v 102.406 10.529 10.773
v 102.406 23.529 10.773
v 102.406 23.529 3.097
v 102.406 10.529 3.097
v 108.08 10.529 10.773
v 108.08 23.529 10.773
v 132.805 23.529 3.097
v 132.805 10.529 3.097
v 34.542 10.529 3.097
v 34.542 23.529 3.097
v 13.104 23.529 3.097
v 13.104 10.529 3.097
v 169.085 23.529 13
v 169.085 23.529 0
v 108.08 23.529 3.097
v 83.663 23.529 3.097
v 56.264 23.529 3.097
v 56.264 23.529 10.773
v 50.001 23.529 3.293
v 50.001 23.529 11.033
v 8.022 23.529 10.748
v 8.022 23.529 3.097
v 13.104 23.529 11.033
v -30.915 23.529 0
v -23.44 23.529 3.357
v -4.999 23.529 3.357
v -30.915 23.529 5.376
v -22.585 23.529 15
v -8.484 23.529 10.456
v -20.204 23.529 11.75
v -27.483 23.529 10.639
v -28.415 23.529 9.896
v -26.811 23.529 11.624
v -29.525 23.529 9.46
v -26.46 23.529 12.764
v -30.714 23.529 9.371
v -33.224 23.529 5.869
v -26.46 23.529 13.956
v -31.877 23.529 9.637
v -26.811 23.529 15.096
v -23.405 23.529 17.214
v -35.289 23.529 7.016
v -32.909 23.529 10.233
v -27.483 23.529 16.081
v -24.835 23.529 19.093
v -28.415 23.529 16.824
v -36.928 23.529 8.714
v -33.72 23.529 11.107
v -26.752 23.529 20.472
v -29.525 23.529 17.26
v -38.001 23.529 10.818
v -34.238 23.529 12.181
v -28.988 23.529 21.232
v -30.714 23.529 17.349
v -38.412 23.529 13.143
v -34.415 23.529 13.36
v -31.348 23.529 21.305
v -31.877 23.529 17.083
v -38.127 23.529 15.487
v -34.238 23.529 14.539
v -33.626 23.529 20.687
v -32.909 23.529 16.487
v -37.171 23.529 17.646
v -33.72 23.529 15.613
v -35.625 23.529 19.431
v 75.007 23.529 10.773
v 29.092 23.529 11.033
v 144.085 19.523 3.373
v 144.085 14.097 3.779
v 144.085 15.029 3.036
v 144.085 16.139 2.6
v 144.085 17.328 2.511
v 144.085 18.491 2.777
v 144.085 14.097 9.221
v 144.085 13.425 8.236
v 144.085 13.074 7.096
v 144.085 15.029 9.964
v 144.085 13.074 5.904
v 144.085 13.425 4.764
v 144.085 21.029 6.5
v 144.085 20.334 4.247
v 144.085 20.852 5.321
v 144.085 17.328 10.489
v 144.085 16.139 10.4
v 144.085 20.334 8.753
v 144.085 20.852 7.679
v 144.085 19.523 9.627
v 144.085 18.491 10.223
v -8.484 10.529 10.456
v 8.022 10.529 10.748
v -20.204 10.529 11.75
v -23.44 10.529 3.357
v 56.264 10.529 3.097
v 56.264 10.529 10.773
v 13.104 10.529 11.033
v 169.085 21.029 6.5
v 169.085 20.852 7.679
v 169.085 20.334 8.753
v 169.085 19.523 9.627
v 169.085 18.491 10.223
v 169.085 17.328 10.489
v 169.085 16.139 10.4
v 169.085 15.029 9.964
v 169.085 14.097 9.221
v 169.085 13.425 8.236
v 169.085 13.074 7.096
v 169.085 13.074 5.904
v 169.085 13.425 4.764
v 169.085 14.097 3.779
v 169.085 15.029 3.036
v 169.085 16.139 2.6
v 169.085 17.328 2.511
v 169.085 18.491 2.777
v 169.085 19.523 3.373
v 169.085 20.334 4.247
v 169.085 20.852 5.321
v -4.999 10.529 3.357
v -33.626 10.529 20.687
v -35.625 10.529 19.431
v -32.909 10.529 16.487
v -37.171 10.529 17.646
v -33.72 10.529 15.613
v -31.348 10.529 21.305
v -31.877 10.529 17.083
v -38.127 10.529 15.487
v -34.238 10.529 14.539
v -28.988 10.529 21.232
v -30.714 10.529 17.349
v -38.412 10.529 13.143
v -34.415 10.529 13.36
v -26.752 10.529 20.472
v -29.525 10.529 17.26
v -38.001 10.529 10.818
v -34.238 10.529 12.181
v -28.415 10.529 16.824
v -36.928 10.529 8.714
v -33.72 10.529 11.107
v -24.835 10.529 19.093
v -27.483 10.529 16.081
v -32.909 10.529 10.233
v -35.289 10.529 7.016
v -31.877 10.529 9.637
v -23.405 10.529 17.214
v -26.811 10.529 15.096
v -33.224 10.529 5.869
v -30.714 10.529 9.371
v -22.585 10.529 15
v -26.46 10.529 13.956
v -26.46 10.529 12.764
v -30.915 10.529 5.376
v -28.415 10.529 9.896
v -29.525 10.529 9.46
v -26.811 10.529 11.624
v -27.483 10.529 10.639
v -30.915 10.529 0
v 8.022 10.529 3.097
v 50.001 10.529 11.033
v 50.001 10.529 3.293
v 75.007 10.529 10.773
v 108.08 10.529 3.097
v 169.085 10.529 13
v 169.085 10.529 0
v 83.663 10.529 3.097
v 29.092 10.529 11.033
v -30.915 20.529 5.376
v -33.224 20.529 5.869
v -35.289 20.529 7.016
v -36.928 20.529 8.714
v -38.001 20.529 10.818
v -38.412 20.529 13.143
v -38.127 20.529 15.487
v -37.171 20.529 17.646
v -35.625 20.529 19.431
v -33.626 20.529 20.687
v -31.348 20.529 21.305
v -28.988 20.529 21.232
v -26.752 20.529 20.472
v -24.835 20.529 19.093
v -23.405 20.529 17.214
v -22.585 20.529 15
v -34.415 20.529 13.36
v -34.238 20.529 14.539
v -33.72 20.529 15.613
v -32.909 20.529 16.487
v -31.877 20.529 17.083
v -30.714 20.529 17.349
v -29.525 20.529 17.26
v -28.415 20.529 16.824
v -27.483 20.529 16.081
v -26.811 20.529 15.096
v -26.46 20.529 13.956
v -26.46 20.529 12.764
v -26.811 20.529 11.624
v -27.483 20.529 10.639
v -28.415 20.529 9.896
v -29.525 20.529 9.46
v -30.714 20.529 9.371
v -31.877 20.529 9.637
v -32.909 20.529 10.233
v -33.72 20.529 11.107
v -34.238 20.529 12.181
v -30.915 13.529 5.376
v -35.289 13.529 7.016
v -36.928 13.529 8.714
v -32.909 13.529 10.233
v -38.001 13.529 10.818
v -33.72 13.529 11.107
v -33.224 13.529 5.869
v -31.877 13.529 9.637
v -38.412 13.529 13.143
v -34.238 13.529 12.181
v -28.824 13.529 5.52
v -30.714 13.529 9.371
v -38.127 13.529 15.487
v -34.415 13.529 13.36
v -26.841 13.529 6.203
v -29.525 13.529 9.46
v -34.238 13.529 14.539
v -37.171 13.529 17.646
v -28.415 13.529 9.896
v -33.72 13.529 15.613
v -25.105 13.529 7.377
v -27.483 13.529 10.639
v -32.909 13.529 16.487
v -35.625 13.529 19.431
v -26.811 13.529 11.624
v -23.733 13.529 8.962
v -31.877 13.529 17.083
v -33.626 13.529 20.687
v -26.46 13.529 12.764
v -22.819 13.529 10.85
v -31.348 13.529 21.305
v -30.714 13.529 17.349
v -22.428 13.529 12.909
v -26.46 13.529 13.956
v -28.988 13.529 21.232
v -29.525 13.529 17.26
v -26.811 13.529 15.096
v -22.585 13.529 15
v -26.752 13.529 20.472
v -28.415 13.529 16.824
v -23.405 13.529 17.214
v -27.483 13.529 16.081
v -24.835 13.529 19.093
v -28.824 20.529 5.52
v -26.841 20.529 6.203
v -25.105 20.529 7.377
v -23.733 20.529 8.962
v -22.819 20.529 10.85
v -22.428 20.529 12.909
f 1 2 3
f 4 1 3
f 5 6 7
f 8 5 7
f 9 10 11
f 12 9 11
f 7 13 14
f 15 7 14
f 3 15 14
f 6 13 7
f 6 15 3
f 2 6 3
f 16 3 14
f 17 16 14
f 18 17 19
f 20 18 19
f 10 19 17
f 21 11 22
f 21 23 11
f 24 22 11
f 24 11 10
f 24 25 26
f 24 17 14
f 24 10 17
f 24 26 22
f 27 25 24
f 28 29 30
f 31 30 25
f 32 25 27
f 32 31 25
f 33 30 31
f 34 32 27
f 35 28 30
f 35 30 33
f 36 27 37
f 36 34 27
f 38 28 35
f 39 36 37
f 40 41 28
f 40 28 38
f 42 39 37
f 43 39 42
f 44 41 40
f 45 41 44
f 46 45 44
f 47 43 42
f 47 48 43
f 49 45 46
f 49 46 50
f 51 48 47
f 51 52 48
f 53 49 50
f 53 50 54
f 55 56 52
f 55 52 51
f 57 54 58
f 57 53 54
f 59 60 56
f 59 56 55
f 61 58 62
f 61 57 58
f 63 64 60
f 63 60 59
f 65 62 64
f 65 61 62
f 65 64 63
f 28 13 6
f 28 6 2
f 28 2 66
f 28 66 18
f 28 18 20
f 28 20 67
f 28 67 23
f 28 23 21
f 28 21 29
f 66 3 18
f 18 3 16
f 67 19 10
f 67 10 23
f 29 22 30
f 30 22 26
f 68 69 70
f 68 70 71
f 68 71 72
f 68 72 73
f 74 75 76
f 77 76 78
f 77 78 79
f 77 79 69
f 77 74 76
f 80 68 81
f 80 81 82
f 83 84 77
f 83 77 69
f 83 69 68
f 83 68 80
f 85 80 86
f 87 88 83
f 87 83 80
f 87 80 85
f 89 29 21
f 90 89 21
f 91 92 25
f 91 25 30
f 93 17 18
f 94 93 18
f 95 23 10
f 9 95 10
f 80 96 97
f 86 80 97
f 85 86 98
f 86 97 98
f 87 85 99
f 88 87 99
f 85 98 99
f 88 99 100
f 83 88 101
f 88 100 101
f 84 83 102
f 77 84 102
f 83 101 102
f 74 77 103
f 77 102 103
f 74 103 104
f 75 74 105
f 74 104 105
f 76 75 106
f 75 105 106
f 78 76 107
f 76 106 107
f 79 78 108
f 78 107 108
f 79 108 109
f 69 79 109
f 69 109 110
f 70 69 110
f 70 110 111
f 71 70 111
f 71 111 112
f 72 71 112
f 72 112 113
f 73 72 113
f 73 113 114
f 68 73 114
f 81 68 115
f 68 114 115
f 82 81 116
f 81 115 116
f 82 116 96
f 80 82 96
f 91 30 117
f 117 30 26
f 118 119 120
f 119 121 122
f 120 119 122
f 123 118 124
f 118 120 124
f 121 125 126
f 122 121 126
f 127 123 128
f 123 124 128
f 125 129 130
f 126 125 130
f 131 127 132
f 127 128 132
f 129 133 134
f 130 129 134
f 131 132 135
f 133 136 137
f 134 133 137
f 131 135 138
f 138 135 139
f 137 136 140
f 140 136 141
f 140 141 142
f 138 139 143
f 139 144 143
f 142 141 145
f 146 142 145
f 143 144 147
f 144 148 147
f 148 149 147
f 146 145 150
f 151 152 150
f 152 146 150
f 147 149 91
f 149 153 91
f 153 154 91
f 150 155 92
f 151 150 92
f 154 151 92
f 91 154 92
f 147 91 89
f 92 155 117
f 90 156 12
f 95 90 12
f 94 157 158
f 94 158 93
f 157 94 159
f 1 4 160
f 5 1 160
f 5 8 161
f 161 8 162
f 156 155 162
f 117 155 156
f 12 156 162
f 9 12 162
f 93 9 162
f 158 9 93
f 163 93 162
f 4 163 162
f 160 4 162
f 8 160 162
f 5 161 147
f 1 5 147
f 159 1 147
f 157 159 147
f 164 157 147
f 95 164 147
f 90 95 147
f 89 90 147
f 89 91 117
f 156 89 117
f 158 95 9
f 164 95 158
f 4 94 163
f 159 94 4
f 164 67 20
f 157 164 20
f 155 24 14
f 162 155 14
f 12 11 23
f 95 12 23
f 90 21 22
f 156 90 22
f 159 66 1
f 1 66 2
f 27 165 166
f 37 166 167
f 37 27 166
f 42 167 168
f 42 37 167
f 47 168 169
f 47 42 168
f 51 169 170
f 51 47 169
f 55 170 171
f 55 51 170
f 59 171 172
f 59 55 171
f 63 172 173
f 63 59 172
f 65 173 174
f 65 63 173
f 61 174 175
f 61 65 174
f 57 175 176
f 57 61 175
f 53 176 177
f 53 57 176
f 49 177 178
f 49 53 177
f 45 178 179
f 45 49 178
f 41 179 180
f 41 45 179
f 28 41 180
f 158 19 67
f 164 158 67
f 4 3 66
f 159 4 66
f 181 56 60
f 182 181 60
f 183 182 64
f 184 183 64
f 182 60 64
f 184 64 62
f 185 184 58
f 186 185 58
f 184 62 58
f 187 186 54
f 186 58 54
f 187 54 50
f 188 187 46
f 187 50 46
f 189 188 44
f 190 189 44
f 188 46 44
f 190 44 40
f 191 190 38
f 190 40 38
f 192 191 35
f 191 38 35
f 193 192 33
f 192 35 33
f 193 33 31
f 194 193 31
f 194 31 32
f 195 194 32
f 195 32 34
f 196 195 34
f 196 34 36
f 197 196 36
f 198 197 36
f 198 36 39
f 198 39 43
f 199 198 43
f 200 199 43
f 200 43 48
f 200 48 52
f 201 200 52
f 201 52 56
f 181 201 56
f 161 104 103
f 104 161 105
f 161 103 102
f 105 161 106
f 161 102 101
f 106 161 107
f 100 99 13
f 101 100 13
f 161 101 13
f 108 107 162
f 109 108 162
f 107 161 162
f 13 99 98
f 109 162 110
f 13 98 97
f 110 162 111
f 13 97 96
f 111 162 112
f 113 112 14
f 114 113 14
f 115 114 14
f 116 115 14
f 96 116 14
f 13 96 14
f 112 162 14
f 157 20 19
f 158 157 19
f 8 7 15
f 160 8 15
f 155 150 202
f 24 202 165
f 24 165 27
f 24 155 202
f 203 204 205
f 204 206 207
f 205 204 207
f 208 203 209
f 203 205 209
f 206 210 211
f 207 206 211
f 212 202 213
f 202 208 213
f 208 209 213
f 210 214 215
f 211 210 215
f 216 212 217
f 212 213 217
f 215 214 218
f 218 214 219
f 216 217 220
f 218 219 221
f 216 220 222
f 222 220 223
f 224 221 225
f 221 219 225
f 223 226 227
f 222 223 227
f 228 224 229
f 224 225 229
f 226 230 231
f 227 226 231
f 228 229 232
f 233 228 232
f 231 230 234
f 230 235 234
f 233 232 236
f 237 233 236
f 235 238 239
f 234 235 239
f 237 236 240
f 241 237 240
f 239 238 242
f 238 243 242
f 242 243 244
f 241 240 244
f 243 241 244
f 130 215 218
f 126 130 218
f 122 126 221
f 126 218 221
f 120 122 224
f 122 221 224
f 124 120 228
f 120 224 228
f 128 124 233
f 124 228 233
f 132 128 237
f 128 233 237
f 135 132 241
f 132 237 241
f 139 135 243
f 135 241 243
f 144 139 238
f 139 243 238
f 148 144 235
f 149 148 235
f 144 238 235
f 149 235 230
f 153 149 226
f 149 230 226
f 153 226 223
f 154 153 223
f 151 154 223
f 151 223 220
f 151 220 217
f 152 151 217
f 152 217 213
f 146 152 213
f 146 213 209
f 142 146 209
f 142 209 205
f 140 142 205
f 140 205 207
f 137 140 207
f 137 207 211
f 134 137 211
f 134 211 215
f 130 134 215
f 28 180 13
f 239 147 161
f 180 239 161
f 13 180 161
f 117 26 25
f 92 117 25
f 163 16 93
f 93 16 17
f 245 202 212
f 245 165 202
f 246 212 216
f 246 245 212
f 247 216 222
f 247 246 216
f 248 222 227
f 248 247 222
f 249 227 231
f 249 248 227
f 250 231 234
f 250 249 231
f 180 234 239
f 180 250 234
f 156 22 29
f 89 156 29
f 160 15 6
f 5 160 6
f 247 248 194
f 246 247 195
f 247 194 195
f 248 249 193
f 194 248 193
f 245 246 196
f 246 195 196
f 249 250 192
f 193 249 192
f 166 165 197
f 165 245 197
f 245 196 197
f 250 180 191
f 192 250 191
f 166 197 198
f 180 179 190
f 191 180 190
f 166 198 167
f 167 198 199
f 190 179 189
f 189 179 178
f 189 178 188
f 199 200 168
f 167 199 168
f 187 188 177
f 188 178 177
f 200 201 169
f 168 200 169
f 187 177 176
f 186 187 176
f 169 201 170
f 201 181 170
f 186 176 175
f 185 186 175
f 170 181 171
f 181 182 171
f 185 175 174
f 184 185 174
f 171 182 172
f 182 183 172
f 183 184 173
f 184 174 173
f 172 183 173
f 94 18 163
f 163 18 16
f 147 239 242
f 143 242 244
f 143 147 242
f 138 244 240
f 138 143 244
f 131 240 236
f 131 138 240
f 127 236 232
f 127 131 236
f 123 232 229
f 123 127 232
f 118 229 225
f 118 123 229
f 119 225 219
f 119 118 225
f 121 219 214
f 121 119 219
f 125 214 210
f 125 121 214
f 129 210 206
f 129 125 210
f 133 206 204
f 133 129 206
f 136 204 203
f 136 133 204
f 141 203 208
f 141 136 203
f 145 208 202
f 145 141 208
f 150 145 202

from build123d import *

# Parameters (mm, degrees)
F0_W      = 200
F0_H      = 13
F1_DEPTH  = 15
F2_R      = 8
F3_DEPTH  = 3
F4_R      = 8
F5_DEPTH  = 3
F6_R      = 4
F7_DEPTH  = 13
F8_R      = 8
F9_DEPTH  = 7
F11_DEPTH = 25
F12_R     = 4
F13_DEPTH = 25
F15_DEPTH = 25


with BuildPart() as f1:
    # F0 (on Top) → F1 (new body)
    with BuildSketch(Plane.XY):
        with Locations((69.0846356191, 17.0292752752)):
            Rectangle(F0_W, F0_H)
    extrude(amount=F1_DEPTH)

    # F2 (on face) → F3 (join)
    with BuildSketch(Plane.XZ.offset(-10.5292752752)):
        with Locations((-30.4153643809, 13.36)):
            Circle(F2_R)
    extrude(amount=-F3_DEPTH)

    # F4 (on face) → F5 (join)
    with BuildSketch(Plane(origin=(0, 23.5292752752, 0), x_dir=(-1, 0, 0), z_dir=(0, 1, 0))):
        with Locations((30.4153643809, 13.36)):
            Circle(F4_R)
    extrude(amount=-F5_DEPTH)

    # F6 (on face) → F7 (cut)
    with BuildSketch(Plane(origin=(0, 23.5292752752, 0), x_dir=(-1, 0, 0), z_dir=(0, 1, 0))):
        with Locations((30.4153643809, 13.36)):
            Circle(F6_R)
    extrude(amount=-F7_DEPTH, mode=Mode.SUBTRACT)

    # F8 (on face) → F9 (cut)
    with BuildSketch(Plane.XZ.offset(-20.5292752752)):
        with Locations((-30.4153643809, 13.36)):
            Circle(F8_R)
    extrude(amount=F9_DEPTH, mode=Mode.SUBTRACT)

    # F10 (on face) → F11 (cut)
    with BuildSketch(Plane.XZ.offset(-10.5292752752)):
        Polygon((169.0846356191, 15), (-22.5852685961, 15), (169.0846356191, 13), align=None)
    extrude(amount=-F11_DEPTH, mode=Mode.SUBTRACT)

    # F12 (on face) → F13 (cut)
    with BuildSketch(Plane.YZ.offset(169.0846356191)):
        with Locations((17.0292752752, 6.5)):
            Circle(F12_R)
    extrude(amount=-F13_DEPTH, mode=Mode.SUBTRACT)

    # F14 (on face) → F15 (cut)
    with BuildSketch(Plane(origin=(0, 23.5292752752, 0), x_dir=(-1, 0, 0), z_dir=(0, 1, 0))):
        Polygon((23.4402101487, 3.3569312654), (20.2043242753, 11.7502389476), (4.9986368977, 3.3569312654), align=None)
        Polygon((-8.0218771473, 3.0973160174), (8.4835188463, 10.455628857), (-8.0218771473, 10.7478844002), align=None)
        Polygon((-34.541686737, 3.0973160174), (-13.1043503061, 3.0973160174), (-13.1043503061, 11.0331652686), align=None)
        Polygon((-50.001192838, 3.2930115703), (-29.0924943984, 11.0331652686), (-50.001192838, 11.0331652686), align=None)
        Polygon((-83.6627408862, 3.0973160174), (-56.263808161, 3.0973160174), (-56.263808161, 10.7733560726), align=None)
        Polygon((-102.4060808122, 3.0973160174), (-75.007148087, 10.7733560726), (-102.4060808122, 10.7733560726), align=None)
        Polygon((-132.8051537275, 3.0973160174), (-108.0802679062, 3.0973160174), (-108.0802679062, 10.7733560726), align=None)
    extrude(amount=-F15_DEPTH, mode=Mode.SUBTRACT)


solid = f1.part
